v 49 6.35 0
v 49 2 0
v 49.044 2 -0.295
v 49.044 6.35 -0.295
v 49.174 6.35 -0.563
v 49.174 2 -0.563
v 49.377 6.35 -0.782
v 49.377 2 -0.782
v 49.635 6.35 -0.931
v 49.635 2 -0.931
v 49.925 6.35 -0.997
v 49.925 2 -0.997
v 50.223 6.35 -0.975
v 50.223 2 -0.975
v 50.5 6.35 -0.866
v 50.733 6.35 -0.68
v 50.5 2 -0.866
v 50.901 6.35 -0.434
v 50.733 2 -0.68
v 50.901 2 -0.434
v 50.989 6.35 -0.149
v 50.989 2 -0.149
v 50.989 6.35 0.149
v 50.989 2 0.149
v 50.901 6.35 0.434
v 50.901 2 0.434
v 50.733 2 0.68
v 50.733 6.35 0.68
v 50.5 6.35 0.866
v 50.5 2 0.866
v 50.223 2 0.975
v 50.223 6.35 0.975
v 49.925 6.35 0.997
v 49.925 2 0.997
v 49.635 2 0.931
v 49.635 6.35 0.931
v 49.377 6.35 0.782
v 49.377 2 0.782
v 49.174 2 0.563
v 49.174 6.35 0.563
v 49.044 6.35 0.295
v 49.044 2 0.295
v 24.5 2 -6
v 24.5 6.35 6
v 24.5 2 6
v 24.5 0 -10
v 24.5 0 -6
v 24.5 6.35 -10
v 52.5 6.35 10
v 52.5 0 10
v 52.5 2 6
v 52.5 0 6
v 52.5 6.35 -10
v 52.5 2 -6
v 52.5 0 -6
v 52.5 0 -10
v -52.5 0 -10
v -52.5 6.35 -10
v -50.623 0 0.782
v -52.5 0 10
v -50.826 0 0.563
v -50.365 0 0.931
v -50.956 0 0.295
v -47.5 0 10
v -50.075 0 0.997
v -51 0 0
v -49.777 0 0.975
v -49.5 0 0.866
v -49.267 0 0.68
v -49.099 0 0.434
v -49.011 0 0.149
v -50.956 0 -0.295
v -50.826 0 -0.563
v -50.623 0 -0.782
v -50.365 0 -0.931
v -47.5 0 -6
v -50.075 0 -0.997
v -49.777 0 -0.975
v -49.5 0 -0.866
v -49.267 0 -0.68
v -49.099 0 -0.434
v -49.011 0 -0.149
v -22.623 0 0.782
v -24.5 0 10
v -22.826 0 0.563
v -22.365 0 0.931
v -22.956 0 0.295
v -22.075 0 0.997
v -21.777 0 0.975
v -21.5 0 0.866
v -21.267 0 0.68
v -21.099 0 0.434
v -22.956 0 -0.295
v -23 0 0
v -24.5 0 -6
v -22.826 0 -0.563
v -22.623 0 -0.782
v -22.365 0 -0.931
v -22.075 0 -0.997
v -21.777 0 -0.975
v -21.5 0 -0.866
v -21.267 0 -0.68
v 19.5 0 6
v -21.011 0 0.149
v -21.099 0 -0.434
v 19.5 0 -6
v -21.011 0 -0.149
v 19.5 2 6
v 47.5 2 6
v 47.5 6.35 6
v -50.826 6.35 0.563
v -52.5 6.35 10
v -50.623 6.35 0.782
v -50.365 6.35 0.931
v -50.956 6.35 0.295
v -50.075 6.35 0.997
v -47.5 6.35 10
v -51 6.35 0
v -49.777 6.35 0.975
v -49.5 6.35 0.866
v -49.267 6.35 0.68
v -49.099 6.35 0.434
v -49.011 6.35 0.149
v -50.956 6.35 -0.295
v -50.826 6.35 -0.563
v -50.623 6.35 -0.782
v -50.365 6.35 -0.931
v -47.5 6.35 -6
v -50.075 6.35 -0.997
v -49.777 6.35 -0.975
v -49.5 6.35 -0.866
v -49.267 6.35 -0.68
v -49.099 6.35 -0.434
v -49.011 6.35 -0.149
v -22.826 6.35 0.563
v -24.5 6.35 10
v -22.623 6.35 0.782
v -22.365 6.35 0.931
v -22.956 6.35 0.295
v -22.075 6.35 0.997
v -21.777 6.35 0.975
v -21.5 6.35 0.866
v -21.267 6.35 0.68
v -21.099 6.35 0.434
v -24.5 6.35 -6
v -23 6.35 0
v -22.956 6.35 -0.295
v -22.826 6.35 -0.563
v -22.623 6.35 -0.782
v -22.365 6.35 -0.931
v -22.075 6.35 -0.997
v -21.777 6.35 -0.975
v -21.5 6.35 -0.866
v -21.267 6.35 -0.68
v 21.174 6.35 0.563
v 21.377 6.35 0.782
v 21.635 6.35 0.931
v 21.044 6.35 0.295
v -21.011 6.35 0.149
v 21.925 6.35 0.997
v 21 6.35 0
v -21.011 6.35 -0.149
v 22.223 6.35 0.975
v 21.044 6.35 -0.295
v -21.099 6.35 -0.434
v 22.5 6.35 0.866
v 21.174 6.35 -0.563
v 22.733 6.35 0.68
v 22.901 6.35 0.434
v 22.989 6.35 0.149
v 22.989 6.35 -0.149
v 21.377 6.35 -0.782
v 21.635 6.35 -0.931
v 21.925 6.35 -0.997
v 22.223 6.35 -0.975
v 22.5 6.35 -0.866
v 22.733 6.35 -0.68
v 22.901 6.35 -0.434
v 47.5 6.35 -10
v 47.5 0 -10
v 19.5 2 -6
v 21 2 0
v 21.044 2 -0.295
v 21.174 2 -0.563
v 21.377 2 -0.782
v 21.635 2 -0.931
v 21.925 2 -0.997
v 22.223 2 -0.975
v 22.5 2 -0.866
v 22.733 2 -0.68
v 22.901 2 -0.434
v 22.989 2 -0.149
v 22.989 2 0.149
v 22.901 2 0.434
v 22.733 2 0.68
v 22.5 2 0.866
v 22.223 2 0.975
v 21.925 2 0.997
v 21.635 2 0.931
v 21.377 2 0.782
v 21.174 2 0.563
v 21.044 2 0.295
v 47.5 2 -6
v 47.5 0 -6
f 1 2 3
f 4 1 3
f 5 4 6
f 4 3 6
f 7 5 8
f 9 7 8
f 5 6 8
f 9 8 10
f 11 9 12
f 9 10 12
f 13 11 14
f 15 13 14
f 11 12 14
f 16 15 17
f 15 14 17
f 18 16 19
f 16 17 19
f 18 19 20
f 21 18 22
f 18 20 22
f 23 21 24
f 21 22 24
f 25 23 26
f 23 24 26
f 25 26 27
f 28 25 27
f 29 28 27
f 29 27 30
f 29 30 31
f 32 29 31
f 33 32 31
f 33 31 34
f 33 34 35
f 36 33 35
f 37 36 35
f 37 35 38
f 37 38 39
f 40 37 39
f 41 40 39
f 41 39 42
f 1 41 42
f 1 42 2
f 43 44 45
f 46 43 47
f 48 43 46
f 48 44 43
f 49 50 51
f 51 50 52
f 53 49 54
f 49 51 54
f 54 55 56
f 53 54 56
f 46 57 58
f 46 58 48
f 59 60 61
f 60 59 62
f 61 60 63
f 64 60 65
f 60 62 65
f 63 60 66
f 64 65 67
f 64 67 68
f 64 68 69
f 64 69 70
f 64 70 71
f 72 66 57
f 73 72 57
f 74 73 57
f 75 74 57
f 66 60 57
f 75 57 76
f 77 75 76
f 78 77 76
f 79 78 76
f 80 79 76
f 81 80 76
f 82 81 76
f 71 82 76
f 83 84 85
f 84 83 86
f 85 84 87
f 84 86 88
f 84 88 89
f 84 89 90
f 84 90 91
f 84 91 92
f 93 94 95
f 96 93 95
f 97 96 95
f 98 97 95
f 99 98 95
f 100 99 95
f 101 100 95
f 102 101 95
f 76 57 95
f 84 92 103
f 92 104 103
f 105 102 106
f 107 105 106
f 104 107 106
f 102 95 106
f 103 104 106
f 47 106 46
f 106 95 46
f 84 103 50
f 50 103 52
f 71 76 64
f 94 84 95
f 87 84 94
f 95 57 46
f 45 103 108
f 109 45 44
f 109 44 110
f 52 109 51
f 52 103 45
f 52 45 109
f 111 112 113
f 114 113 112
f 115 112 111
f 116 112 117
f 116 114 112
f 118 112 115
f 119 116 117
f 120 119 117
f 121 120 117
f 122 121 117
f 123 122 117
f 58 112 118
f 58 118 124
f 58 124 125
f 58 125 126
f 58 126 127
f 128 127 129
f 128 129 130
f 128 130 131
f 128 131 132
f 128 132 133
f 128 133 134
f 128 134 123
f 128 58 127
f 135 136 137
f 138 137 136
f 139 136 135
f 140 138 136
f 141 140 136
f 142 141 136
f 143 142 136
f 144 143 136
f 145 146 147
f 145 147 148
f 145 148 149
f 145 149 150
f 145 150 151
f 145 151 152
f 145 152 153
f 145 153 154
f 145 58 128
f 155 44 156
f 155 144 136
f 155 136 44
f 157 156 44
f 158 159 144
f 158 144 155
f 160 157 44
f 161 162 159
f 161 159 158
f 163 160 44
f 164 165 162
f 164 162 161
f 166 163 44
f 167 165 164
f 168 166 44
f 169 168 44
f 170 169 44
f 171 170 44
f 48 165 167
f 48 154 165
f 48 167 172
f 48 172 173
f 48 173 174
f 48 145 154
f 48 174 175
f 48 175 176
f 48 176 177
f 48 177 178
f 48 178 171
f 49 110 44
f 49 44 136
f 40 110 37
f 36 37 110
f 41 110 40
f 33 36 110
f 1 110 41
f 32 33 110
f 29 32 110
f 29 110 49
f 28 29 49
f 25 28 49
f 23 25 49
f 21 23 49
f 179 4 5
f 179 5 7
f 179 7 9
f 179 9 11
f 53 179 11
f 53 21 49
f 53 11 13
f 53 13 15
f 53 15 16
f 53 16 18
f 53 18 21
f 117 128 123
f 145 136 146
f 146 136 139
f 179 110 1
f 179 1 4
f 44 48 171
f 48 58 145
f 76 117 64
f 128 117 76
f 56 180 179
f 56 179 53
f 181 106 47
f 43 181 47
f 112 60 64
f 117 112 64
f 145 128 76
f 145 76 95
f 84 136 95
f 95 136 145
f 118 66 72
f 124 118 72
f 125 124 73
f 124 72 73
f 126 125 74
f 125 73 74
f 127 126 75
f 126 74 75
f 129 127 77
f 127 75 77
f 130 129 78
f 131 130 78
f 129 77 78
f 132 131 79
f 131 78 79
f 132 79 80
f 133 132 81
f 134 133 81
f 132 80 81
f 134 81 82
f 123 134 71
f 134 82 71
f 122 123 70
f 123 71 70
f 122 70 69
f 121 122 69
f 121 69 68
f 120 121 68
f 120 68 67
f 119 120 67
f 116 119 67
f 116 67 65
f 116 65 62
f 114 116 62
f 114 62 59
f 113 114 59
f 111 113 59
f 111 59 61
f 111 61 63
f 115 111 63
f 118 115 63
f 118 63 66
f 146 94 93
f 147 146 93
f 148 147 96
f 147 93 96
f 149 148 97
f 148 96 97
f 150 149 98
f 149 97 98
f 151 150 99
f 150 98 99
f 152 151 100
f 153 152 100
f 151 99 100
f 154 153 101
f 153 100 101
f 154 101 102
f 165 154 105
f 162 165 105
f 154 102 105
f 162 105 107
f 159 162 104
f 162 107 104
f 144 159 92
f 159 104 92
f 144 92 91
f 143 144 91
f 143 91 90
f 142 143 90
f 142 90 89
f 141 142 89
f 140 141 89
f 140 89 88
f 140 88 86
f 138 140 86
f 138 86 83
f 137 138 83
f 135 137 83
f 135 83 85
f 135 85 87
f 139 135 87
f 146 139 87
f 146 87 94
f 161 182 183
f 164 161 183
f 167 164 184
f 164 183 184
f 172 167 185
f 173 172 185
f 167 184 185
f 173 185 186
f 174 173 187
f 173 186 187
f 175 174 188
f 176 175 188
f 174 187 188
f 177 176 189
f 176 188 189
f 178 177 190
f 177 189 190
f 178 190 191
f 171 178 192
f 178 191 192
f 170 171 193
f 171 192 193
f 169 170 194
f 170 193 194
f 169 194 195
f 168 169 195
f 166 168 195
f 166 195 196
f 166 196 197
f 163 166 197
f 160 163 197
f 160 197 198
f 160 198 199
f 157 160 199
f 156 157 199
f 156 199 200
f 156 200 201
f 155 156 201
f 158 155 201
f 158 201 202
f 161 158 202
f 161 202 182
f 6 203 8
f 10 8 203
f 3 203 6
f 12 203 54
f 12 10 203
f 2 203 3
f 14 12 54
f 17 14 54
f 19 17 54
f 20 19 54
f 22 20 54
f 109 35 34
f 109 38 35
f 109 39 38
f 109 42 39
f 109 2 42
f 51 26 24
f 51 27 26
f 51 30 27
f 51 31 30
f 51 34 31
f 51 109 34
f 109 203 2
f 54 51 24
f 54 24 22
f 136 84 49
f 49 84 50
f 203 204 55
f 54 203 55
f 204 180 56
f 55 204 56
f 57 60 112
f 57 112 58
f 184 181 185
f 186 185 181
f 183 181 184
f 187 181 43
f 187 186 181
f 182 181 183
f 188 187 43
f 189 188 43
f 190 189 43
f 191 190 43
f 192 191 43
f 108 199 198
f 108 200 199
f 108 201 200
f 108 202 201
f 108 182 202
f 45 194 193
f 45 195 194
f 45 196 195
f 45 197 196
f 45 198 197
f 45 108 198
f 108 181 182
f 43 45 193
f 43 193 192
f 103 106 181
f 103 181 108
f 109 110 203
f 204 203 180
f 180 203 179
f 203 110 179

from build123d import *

# Parameters (mm, degrees)
SKETCH1_W            = 105
SKETCH1_H            = 20
BOSS_EXTRUDE1_DEPTH  = 6.35
SKETCH3_W            = 23
SKETCH3_H            = 16
CUT_EXTRUDE1_DEPTH   = 54.819815124
SKETCH4_W            = 5
SKETCH4_H            = 12
CUT_EXTRUDE2_DEPTH   = 2
M2_CLEARANCE_HOLE1_D = 2


with BuildPart() as part:
    # Sketch1 → Boss-Extrude1 (new body)
    with BuildSketch(Plane(origin=(0, 0, 0), x_dir=(1, 0, 0), z_dir=(0, 1, 0))):
        Rectangle(SKETCH1_W, SKETCH1_H)
    extrude(amount=BOSS_EXTRUDE1_DEPTH)

    # Sketch3 → Cut-Extrude1 (cut, through all)
    with BuildSketch(Plane(origin=(0, 6.35, 0), x_dir=(1, 0, 0), z_dir=(0, 1, 0))):
        with Locations((-36, -2)):
            Rectangle(SKETCH3_W, SKETCH3_H)
        with Locations((36, 2)):
            Rectangle(SKETCH3_W, SKETCH3_H)
    extrude(amount=-CUT_EXTRUDE1_DEPTH, mode=Mode.SUBTRACT)

    # Sketch4 → Cut-Extrude2 (cut)
    with BuildSketch(Plane.XZ):
        with Locations((22, 0)):
            Rectangle(SKETCH4_W, SKETCH4_H)
        with Locations((50, 0)):
            Rectangle(SKETCH4_W, SKETCH4_H)
    extrude(amount=-CUT_EXTRUDE2_DEPTH, mode=Mode.SUBTRACT)

    # M2 Clearance Hole1 (through all)
    with Locations(Plane(origin=(0, 6.35, 0), x_dir=(1, 0, 0), z_dir=(0, 1, 0))):
        with Locations((50, 0), (-50, 0), (-22, 0), (22, 0)):
            Hole(M2_CLEARANCE_HOLE1_D / 2)


solid = part.part
